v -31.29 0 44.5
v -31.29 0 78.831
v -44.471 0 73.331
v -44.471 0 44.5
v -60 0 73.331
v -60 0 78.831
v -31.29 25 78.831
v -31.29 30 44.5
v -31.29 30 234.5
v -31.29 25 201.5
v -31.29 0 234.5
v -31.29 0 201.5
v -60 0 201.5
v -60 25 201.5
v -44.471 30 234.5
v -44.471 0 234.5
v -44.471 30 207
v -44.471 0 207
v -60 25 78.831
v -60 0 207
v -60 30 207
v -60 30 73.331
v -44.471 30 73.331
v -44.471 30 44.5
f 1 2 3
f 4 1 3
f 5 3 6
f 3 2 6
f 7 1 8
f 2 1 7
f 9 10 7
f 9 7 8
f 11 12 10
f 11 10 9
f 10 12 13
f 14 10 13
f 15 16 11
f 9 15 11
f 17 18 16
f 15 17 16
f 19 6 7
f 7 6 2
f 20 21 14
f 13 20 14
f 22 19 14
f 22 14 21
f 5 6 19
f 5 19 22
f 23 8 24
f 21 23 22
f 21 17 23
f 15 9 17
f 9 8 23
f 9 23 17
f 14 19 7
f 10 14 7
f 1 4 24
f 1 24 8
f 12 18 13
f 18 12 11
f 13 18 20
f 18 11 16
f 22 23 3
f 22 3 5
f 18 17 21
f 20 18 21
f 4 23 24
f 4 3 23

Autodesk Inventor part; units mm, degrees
ref_plane "YZ Plane" through (0, 0, 0) normal (1, 0, 0) x (0, 1, 0)
ref_plane "XZ Plane" through (0, 0, 0) normal (0, 1, 0) x (-1, 0, 0)
ref_plane "XY Plane" through (0, 0, 0) normal (0, 0, 1) x (1, 0, 0)
sketch "Эскиз1" plane through (0, 0, 0) normal (0, 1, 0) x (-1, 0, 0)
  line L0 (44.4709, 73.3307) -> (60, 73.3307)
  line L1 (44.4709, 73.3307) -> (44.4709, 28.3307)
  line L2 (44.4709, 207.0004) -> (60, 207.0004)
  line L3 (44.4709, 207.0004) -> (44.4709, 252.0004)
  line L4 (31.29, 29.5004) -> (31.29, 249.5004)
  line L5 (31.29, 201.5002) -> (60, 201.5002)
  line L6 (60, 78.8309) -> (31.29, 78.8309)
  line L7 (44.4709, 234.5004) -> (31.29, 234.5004)
  line L8 (44.4709, 44.5004) -> (31.29, 44.5004)
  line L9 (31.29, 139.5004) -> (37.8804, 139.5004)
  line L10 (60, 207.0004) -> (60, 201.5002)
  line L11 (60, 78.8309) -> (60, 73.3307)
  point P0 (0, 0)
  dimension "d0" = 5.5002
  dimension "d1" = 5.5002
  dimension "d2" = 95
extrude "Выдавливание1" add sketch "Эскиз1" along normal blind 30
sketch "Эскиз2" plane through (0, 30, 0) normal (0, 1, 0) x (1, 0, 0)
  line L0 (-60, -201.5002) -> (-60, -207.0004) projected
  line L1 (-31.29, -78.8309) -> (-31.29, -44.5004) projected
  line L2 (-60, -207.0004) -> (-31.29, -207.0004)
  line L3 (-31.29, -207.0004) -> (-31.29, -73.3307)
  line L4 (-31.29, -73.3307) -> (-60, -73.3307)
  line L5 (-60, -73.3307) -> (-60, -207.0004)
  point P0 (0, 0)
extrude "Выдавливание2" add sketch "Эскиз2" against normal blind 5
equation "\"d1\" = d0"
properties part number "KB33-046-010 - Панель управления"
